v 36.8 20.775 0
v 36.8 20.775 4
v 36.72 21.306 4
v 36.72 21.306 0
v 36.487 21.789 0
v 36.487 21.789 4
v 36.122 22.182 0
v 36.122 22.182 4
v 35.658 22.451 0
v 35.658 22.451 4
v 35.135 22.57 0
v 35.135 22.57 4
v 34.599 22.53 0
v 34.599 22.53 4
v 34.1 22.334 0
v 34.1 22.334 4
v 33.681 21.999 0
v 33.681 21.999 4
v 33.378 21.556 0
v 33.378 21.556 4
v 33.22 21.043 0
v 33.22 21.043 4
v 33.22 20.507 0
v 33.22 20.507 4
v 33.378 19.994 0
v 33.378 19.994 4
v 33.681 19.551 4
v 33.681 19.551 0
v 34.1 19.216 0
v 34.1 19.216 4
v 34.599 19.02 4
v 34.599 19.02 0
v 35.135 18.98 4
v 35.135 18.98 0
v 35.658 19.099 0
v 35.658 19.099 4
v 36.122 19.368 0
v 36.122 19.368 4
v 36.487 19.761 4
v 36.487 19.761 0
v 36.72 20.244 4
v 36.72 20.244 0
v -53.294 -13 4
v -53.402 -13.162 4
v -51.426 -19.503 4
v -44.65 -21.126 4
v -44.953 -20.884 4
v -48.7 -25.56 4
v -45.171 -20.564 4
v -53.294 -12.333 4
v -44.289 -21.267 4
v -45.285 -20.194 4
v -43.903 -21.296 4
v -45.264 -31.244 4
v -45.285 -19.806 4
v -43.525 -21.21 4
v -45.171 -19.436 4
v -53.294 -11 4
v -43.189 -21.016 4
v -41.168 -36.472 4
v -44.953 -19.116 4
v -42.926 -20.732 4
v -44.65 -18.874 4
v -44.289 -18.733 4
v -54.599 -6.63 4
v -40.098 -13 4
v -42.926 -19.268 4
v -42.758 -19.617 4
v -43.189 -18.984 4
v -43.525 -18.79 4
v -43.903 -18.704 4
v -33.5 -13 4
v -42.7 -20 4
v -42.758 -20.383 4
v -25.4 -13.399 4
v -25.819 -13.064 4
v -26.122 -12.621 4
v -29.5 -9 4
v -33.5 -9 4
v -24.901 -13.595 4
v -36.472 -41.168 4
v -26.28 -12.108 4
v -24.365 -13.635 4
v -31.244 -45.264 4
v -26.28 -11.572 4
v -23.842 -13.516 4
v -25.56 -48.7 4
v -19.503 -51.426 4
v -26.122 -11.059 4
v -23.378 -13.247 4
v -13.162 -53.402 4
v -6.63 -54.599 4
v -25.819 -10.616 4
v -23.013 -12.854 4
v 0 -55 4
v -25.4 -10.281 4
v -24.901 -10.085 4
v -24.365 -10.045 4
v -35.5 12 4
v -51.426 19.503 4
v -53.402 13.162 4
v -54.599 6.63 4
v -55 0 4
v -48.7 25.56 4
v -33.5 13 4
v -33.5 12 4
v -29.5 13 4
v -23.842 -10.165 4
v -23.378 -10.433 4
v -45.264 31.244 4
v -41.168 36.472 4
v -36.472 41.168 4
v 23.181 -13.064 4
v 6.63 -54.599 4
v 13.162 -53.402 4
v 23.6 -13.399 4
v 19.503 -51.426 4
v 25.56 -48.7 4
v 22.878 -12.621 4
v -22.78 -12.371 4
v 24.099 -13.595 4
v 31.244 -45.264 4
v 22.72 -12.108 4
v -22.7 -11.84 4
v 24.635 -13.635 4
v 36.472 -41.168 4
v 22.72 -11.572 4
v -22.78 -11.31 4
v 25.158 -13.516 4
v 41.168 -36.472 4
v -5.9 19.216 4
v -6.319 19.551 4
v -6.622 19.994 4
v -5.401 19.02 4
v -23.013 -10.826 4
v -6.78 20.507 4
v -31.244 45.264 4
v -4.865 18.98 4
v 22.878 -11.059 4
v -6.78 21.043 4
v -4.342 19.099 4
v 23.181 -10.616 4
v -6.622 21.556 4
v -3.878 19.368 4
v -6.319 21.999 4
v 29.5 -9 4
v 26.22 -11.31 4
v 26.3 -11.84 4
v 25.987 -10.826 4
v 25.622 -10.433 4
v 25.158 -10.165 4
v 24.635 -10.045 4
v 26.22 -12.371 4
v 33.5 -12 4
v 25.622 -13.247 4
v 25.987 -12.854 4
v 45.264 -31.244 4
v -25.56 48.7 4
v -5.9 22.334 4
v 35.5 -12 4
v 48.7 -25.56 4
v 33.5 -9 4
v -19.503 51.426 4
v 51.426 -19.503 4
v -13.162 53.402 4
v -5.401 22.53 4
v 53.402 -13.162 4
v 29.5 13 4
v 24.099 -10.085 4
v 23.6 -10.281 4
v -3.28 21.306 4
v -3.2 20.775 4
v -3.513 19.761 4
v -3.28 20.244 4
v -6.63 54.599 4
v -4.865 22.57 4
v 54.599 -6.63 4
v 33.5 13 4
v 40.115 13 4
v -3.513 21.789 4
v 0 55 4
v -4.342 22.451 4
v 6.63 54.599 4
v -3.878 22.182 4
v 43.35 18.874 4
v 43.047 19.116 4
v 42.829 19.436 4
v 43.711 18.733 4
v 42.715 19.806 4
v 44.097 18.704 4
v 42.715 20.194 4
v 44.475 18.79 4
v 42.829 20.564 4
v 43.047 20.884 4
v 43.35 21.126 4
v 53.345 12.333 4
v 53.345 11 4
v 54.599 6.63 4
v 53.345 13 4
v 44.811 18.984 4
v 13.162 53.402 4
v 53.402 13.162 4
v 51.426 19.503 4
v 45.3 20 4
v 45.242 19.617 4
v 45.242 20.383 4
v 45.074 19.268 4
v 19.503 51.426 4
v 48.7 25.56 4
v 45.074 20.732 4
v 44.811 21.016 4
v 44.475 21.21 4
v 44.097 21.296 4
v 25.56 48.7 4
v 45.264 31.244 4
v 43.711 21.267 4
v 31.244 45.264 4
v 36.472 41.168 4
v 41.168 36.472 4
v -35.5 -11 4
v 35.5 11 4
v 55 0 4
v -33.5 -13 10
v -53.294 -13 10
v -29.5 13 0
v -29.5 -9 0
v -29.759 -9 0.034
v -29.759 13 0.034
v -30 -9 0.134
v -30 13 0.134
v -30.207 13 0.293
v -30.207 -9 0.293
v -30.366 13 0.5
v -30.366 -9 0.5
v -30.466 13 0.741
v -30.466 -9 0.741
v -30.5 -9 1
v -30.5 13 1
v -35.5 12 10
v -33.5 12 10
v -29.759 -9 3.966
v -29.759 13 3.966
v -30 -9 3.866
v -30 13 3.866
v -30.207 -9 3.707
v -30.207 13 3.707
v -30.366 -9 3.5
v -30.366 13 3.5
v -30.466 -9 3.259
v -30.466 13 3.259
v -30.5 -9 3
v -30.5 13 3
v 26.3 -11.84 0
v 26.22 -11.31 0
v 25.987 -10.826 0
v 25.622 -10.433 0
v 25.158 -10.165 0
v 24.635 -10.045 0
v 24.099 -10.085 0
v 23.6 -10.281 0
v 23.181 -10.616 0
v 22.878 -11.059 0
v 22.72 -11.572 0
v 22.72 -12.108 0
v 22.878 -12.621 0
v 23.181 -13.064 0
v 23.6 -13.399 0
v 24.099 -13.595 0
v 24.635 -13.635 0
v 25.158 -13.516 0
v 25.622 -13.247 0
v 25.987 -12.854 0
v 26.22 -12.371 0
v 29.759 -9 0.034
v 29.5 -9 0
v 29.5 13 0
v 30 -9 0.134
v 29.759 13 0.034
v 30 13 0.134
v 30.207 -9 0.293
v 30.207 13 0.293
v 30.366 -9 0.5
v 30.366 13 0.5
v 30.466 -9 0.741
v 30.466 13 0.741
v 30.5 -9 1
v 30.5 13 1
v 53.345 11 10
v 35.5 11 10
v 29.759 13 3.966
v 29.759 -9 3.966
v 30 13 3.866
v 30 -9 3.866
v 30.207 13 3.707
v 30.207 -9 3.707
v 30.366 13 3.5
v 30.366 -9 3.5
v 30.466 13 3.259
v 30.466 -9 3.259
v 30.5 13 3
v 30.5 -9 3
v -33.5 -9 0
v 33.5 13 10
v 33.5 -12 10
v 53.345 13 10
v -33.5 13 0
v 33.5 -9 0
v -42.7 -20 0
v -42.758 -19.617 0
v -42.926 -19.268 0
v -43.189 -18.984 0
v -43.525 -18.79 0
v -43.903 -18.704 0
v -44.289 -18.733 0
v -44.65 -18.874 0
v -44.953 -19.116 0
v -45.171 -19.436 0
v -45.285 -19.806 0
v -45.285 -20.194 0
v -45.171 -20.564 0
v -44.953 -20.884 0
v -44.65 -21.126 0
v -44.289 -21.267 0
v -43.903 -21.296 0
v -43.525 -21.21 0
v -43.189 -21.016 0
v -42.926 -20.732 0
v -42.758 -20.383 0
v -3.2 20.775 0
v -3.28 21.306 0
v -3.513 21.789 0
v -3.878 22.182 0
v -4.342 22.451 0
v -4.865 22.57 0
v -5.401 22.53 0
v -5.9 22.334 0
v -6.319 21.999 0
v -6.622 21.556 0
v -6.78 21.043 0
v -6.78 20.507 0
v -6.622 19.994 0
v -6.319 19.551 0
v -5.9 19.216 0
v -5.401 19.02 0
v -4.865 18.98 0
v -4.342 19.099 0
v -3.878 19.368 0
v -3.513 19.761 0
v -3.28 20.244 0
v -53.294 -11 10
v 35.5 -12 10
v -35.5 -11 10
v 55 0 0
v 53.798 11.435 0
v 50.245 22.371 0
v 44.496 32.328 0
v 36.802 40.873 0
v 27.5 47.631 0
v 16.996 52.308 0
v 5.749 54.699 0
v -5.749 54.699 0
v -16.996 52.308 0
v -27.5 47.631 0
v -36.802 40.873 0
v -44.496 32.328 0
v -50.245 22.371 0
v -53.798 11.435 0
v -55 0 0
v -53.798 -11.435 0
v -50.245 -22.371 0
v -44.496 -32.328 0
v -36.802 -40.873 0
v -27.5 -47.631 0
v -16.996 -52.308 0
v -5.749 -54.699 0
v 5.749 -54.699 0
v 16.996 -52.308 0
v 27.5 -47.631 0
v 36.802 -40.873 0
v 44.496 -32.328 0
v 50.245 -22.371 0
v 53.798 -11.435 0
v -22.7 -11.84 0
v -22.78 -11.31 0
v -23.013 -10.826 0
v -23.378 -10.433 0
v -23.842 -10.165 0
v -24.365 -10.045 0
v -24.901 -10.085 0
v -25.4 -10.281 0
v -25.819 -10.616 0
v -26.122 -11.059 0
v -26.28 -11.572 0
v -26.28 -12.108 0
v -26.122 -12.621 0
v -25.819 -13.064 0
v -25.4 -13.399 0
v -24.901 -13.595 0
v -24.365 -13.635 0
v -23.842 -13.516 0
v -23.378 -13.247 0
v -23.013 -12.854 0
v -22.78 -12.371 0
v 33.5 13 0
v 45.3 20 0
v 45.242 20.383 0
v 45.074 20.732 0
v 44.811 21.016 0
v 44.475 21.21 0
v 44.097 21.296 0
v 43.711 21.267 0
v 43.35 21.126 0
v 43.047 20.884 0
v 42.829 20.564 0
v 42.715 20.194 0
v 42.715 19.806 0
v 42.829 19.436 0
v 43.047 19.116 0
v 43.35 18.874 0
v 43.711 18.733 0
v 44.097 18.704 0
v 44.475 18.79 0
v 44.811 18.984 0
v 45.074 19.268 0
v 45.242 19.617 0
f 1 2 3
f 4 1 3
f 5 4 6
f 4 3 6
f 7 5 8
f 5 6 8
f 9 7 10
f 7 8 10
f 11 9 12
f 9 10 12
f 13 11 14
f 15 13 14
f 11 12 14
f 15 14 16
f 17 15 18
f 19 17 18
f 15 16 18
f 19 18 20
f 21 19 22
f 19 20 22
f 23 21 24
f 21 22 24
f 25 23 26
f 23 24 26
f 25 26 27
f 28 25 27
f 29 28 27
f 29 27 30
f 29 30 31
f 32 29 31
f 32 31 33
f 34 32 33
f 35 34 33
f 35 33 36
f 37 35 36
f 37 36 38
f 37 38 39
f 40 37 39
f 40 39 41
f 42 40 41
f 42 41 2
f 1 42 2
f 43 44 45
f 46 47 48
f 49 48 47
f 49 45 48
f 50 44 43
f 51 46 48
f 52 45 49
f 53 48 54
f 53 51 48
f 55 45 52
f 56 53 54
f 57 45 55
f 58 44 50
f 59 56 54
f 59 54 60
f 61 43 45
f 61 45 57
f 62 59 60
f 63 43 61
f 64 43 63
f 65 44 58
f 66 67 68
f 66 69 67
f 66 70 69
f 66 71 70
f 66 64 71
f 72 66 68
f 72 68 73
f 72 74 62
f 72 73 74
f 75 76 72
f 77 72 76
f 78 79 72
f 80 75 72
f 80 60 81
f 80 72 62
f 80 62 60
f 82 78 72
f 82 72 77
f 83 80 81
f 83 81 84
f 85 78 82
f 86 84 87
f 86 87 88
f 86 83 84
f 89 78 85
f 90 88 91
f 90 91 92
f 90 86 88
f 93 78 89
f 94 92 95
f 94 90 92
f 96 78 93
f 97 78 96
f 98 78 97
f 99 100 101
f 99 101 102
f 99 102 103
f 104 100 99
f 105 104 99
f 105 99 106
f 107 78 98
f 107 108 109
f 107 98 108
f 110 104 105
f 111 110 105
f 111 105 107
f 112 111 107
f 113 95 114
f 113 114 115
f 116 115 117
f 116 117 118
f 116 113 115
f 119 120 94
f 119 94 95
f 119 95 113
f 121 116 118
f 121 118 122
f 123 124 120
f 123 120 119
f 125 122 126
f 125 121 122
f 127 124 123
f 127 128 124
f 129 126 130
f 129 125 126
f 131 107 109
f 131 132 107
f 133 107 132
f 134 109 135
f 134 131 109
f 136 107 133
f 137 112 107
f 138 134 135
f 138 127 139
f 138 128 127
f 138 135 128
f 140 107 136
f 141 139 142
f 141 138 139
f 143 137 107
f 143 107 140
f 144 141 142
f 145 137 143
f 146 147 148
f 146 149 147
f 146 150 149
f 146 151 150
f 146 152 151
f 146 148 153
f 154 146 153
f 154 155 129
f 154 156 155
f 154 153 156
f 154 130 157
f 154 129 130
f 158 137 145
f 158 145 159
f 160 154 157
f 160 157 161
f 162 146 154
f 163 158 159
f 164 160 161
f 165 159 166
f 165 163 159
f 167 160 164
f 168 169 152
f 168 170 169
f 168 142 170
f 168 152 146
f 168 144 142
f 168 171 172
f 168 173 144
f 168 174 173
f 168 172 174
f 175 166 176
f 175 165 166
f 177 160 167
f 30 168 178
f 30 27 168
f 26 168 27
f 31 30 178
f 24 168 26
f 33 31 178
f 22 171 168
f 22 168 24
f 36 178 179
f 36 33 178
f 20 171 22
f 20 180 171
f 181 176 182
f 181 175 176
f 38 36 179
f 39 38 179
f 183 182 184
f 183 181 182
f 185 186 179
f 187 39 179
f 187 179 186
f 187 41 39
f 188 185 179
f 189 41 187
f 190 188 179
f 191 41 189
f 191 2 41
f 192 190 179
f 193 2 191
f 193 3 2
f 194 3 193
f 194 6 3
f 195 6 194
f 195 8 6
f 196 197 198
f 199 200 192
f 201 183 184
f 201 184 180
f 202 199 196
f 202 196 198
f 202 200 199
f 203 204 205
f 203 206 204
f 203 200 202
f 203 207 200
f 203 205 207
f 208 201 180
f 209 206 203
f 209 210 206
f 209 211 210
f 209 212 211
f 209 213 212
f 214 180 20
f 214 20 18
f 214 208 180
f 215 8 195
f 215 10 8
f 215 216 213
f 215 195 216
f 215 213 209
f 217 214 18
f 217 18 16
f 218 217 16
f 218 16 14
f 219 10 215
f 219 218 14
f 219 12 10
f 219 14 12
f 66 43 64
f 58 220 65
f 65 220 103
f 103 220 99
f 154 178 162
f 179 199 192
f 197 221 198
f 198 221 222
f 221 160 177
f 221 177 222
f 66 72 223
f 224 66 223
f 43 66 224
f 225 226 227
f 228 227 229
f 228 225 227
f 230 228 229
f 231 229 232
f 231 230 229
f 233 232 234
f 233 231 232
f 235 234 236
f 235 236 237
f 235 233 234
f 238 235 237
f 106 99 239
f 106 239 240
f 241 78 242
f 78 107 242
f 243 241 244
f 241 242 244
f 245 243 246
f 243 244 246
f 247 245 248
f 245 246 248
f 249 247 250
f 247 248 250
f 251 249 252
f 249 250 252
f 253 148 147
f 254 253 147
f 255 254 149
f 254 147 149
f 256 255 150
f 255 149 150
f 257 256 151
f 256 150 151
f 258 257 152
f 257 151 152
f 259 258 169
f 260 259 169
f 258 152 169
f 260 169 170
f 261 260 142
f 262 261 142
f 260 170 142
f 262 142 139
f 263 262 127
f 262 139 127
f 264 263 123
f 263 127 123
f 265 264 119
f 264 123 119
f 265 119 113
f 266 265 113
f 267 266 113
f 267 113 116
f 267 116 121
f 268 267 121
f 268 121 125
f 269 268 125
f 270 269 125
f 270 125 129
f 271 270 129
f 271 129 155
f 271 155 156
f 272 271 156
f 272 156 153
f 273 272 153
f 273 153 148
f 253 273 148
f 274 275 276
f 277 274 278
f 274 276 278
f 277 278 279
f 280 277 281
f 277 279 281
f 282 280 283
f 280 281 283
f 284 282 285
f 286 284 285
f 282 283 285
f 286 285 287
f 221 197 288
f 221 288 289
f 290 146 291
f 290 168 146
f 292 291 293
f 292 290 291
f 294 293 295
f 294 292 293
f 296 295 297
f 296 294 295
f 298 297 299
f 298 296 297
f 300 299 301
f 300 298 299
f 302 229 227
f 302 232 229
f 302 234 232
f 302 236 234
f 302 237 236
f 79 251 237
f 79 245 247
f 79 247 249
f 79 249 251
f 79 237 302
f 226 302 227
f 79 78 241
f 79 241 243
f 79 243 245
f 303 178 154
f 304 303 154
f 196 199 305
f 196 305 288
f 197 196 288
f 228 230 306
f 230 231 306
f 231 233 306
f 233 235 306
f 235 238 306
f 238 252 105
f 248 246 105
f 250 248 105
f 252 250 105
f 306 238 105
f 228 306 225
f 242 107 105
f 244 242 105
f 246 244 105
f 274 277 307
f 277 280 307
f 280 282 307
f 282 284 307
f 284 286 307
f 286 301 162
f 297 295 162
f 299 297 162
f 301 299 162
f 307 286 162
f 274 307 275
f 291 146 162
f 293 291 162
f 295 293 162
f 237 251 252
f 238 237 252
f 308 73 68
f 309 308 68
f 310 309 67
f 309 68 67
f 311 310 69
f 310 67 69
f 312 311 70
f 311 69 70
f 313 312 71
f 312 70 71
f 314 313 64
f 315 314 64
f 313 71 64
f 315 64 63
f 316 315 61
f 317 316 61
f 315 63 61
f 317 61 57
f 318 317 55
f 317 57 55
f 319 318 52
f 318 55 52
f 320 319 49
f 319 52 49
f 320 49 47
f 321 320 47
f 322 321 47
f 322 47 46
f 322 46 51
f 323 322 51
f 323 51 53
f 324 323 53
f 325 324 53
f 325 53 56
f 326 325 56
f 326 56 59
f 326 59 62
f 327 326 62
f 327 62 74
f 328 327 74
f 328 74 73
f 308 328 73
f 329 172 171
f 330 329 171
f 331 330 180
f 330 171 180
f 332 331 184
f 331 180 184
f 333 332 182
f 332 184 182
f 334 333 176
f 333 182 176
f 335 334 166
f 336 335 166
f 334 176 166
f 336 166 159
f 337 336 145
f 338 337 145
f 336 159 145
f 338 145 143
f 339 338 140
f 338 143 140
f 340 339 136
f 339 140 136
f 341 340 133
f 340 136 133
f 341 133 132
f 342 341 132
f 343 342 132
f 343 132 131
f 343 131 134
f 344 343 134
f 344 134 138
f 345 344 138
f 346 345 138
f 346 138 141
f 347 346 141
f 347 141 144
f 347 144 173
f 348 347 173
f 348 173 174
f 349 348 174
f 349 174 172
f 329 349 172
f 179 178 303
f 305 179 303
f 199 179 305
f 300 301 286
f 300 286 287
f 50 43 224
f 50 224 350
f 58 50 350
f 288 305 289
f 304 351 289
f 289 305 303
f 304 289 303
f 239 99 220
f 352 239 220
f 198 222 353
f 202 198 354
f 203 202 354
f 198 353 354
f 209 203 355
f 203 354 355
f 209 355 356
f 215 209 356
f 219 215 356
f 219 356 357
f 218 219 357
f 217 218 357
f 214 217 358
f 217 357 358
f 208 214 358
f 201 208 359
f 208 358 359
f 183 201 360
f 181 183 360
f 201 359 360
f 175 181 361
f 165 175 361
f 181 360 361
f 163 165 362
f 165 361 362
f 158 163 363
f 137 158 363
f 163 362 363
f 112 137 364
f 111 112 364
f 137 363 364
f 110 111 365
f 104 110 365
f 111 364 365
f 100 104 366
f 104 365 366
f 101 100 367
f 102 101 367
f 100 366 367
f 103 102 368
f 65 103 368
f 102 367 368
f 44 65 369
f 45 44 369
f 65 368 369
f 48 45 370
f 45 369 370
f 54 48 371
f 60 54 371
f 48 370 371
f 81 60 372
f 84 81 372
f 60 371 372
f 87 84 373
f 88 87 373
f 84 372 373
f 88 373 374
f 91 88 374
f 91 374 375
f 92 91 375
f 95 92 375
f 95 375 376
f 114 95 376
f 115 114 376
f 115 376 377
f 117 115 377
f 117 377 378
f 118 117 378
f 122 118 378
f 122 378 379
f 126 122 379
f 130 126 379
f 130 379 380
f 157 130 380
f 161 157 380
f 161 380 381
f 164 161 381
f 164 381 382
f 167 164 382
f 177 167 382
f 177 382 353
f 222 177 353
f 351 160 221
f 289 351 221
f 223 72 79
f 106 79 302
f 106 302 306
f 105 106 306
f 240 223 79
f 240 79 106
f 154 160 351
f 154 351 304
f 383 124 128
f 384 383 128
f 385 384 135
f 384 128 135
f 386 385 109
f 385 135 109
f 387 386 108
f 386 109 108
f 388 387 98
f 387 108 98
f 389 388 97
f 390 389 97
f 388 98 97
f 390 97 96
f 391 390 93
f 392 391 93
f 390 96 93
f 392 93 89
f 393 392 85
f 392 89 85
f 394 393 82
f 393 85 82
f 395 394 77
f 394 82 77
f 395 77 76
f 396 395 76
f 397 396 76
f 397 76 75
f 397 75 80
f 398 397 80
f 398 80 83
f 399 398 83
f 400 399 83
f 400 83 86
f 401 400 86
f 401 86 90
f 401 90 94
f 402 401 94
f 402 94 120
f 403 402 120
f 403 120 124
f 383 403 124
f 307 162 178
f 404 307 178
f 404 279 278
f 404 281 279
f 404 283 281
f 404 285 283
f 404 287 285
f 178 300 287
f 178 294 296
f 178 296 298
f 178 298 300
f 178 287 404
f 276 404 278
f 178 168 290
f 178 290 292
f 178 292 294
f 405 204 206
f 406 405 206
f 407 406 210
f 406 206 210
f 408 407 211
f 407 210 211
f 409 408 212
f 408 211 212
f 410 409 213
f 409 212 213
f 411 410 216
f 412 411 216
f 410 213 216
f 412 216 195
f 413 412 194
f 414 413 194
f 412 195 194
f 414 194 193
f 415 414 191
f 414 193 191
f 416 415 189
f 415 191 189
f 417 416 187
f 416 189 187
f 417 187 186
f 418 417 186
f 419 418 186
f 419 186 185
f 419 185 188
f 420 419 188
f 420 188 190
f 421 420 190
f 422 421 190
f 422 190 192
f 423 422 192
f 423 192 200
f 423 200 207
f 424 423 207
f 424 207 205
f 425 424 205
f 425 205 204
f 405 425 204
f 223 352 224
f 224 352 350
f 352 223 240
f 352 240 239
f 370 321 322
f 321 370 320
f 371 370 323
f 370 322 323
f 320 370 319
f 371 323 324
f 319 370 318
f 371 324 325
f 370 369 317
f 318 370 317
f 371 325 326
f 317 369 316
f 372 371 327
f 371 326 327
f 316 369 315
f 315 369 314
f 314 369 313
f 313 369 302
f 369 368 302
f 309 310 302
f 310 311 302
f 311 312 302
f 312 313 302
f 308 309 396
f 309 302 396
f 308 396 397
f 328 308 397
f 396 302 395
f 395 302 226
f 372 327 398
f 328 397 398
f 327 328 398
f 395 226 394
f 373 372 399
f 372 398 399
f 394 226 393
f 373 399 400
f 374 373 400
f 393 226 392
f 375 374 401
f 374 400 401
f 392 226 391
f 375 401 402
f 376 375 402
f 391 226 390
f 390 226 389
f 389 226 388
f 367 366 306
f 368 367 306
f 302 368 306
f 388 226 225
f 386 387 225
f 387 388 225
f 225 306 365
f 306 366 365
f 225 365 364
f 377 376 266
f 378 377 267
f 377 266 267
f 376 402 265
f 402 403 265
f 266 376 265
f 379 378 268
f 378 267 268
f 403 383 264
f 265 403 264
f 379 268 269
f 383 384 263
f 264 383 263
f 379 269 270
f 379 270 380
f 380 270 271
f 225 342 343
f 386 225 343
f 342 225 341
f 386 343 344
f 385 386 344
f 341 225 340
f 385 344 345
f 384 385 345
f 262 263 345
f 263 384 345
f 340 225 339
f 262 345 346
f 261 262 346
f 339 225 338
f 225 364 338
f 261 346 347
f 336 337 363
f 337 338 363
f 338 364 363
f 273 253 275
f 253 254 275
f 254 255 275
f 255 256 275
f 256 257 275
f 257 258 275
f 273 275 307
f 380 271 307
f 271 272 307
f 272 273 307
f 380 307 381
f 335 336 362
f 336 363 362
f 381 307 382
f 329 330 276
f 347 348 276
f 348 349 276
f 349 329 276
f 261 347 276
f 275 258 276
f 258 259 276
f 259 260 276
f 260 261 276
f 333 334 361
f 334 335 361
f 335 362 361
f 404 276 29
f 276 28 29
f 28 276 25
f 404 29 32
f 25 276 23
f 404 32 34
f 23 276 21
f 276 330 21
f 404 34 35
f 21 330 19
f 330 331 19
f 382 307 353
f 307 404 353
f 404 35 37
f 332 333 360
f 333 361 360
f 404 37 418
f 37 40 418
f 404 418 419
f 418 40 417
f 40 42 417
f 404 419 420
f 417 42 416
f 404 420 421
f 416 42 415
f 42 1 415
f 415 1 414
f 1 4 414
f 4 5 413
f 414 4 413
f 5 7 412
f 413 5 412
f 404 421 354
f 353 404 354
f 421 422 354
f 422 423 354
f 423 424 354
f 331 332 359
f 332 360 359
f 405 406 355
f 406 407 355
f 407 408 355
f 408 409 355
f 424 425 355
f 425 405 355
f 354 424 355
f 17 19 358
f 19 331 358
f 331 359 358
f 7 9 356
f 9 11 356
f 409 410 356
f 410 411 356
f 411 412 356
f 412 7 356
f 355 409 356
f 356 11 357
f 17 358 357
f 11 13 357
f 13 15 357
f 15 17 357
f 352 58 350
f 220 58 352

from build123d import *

# Parameters (mm, degrees)
SKETCH_R        = 55
PAD_DEPTH       = 4
SKETCH002_R     = 1.8
POCKET_DEPTH    = 5
PAD001_DEPTH    = 6
SKETCH003_R     = 1.3
POCKET001_DEPTH = 5
SKETCH004_W     = 3
SKETCH004_H     = 22
POCKET002_DEPTH = 5
FILLET_R        = 1
FILLET001_R     = 1
FILLET002_R     = 1
FILLET003_R     = 1


with BuildPart() as part:
    # Sketch → Pad (new body)
    with BuildSketch(Plane.XY):
        Circle(SKETCH_R)
    extrude(amount=PAD_DEPTH)

    # Sketch002 → Pocket (cut)
    with BuildSketch(Plane.XY.offset(4)):
        with Locations((-24.5, -11.840143)):
            Circle(SKETCH002_R)
        with Locations((24.5, -11.840143)):
            Circle(SKETCH002_R)
        with Locations((-5, 20.774952)):
            Circle(SKETCH002_R)
        with Locations((35, 20.774952)):
            Circle(SKETCH002_R)
    extrude(amount=-POCKET_DEPTH, mode=Mode.SUBTRACT)

    # Sketch001 (on Face3 of Pad) → Pad001 (join)
    with BuildSketch(Plane.XY.offset(4)):
        Polygon((33.500008, 0), (33.500008, 13), (53.345406, 13), (53.345406, 11), (35.5, 11), (35.5, -0.005684), (35.5, -12), (33.500008, -12), align=None)
        Polygon((-33.5, 0), (-33.5, -13), (-53.293575, -13), (-53.293575, -11), (-35.5, -11), (-35.5, 0.001212), (-35.5, 12), (-33.5, 12), align=None)
    extrude(amount=PAD001_DEPTH)

    # Sketch003 (on Face3 of Pad001) → Pocket001 (cut)
    with BuildSketch(Plane.XY.offset(4)):
        with Locations((-44, -20)):
            Circle(SKETCH003_R)
        with Locations((44, 20)):
            Circle(SKETCH003_R)
    extrude(amount=-POCKET001_DEPTH, mode=Mode.SUBTRACT)

    # Sketch004 → Pocket002 (cut)
    with BuildSketch(Plane.XY.offset(4)):
        with Locations((32, 2)):
            Rectangle(SKETCH004_W, SKETCH004_H)
    pocket002 = extrude(amount=-POCKET002_DEPTH, mode=Mode.SUBTRACT)

    # Mirrored: Pocket002 across Sketch004 V_Axis
    add(pocket002.mirror(Plane(origin=(0, 0, 4), x_dir=(0, 0, 1), z_dir=(1, 0, 0))), mode=Mode.SUBTRACT)

    # Fillet
    fillet_edges = [part.edges().sort_by_distance(p)[0] for p in [
        (30.5, 2, 4),
    ]]
    fillet(fillet_edges, radius=FILLET_R)

    # Fillet001
    fillet001_edges = [part.edges().sort_by_distance(p)[0] for p in [
        (-30.5, 2, 4),
    ]]
    fillet(fillet001_edges, radius=FILLET001_R)

    # Fillet002
    fillet002_edges = [part.edges().sort_by_distance(p)[0] for p in [
        (-30.5, 2, 0),
    ]]
    fillet(fillet002_edges, radius=FILLET002_R)

    # Fillet003
    fillet003_edges = [part.edges().sort_by_distance(p)[0] for p in [
        (30.5, 2, 0),
    ]]
    fillet(fillet003_edges, radius=FILLET003_R)


solid = part.part
